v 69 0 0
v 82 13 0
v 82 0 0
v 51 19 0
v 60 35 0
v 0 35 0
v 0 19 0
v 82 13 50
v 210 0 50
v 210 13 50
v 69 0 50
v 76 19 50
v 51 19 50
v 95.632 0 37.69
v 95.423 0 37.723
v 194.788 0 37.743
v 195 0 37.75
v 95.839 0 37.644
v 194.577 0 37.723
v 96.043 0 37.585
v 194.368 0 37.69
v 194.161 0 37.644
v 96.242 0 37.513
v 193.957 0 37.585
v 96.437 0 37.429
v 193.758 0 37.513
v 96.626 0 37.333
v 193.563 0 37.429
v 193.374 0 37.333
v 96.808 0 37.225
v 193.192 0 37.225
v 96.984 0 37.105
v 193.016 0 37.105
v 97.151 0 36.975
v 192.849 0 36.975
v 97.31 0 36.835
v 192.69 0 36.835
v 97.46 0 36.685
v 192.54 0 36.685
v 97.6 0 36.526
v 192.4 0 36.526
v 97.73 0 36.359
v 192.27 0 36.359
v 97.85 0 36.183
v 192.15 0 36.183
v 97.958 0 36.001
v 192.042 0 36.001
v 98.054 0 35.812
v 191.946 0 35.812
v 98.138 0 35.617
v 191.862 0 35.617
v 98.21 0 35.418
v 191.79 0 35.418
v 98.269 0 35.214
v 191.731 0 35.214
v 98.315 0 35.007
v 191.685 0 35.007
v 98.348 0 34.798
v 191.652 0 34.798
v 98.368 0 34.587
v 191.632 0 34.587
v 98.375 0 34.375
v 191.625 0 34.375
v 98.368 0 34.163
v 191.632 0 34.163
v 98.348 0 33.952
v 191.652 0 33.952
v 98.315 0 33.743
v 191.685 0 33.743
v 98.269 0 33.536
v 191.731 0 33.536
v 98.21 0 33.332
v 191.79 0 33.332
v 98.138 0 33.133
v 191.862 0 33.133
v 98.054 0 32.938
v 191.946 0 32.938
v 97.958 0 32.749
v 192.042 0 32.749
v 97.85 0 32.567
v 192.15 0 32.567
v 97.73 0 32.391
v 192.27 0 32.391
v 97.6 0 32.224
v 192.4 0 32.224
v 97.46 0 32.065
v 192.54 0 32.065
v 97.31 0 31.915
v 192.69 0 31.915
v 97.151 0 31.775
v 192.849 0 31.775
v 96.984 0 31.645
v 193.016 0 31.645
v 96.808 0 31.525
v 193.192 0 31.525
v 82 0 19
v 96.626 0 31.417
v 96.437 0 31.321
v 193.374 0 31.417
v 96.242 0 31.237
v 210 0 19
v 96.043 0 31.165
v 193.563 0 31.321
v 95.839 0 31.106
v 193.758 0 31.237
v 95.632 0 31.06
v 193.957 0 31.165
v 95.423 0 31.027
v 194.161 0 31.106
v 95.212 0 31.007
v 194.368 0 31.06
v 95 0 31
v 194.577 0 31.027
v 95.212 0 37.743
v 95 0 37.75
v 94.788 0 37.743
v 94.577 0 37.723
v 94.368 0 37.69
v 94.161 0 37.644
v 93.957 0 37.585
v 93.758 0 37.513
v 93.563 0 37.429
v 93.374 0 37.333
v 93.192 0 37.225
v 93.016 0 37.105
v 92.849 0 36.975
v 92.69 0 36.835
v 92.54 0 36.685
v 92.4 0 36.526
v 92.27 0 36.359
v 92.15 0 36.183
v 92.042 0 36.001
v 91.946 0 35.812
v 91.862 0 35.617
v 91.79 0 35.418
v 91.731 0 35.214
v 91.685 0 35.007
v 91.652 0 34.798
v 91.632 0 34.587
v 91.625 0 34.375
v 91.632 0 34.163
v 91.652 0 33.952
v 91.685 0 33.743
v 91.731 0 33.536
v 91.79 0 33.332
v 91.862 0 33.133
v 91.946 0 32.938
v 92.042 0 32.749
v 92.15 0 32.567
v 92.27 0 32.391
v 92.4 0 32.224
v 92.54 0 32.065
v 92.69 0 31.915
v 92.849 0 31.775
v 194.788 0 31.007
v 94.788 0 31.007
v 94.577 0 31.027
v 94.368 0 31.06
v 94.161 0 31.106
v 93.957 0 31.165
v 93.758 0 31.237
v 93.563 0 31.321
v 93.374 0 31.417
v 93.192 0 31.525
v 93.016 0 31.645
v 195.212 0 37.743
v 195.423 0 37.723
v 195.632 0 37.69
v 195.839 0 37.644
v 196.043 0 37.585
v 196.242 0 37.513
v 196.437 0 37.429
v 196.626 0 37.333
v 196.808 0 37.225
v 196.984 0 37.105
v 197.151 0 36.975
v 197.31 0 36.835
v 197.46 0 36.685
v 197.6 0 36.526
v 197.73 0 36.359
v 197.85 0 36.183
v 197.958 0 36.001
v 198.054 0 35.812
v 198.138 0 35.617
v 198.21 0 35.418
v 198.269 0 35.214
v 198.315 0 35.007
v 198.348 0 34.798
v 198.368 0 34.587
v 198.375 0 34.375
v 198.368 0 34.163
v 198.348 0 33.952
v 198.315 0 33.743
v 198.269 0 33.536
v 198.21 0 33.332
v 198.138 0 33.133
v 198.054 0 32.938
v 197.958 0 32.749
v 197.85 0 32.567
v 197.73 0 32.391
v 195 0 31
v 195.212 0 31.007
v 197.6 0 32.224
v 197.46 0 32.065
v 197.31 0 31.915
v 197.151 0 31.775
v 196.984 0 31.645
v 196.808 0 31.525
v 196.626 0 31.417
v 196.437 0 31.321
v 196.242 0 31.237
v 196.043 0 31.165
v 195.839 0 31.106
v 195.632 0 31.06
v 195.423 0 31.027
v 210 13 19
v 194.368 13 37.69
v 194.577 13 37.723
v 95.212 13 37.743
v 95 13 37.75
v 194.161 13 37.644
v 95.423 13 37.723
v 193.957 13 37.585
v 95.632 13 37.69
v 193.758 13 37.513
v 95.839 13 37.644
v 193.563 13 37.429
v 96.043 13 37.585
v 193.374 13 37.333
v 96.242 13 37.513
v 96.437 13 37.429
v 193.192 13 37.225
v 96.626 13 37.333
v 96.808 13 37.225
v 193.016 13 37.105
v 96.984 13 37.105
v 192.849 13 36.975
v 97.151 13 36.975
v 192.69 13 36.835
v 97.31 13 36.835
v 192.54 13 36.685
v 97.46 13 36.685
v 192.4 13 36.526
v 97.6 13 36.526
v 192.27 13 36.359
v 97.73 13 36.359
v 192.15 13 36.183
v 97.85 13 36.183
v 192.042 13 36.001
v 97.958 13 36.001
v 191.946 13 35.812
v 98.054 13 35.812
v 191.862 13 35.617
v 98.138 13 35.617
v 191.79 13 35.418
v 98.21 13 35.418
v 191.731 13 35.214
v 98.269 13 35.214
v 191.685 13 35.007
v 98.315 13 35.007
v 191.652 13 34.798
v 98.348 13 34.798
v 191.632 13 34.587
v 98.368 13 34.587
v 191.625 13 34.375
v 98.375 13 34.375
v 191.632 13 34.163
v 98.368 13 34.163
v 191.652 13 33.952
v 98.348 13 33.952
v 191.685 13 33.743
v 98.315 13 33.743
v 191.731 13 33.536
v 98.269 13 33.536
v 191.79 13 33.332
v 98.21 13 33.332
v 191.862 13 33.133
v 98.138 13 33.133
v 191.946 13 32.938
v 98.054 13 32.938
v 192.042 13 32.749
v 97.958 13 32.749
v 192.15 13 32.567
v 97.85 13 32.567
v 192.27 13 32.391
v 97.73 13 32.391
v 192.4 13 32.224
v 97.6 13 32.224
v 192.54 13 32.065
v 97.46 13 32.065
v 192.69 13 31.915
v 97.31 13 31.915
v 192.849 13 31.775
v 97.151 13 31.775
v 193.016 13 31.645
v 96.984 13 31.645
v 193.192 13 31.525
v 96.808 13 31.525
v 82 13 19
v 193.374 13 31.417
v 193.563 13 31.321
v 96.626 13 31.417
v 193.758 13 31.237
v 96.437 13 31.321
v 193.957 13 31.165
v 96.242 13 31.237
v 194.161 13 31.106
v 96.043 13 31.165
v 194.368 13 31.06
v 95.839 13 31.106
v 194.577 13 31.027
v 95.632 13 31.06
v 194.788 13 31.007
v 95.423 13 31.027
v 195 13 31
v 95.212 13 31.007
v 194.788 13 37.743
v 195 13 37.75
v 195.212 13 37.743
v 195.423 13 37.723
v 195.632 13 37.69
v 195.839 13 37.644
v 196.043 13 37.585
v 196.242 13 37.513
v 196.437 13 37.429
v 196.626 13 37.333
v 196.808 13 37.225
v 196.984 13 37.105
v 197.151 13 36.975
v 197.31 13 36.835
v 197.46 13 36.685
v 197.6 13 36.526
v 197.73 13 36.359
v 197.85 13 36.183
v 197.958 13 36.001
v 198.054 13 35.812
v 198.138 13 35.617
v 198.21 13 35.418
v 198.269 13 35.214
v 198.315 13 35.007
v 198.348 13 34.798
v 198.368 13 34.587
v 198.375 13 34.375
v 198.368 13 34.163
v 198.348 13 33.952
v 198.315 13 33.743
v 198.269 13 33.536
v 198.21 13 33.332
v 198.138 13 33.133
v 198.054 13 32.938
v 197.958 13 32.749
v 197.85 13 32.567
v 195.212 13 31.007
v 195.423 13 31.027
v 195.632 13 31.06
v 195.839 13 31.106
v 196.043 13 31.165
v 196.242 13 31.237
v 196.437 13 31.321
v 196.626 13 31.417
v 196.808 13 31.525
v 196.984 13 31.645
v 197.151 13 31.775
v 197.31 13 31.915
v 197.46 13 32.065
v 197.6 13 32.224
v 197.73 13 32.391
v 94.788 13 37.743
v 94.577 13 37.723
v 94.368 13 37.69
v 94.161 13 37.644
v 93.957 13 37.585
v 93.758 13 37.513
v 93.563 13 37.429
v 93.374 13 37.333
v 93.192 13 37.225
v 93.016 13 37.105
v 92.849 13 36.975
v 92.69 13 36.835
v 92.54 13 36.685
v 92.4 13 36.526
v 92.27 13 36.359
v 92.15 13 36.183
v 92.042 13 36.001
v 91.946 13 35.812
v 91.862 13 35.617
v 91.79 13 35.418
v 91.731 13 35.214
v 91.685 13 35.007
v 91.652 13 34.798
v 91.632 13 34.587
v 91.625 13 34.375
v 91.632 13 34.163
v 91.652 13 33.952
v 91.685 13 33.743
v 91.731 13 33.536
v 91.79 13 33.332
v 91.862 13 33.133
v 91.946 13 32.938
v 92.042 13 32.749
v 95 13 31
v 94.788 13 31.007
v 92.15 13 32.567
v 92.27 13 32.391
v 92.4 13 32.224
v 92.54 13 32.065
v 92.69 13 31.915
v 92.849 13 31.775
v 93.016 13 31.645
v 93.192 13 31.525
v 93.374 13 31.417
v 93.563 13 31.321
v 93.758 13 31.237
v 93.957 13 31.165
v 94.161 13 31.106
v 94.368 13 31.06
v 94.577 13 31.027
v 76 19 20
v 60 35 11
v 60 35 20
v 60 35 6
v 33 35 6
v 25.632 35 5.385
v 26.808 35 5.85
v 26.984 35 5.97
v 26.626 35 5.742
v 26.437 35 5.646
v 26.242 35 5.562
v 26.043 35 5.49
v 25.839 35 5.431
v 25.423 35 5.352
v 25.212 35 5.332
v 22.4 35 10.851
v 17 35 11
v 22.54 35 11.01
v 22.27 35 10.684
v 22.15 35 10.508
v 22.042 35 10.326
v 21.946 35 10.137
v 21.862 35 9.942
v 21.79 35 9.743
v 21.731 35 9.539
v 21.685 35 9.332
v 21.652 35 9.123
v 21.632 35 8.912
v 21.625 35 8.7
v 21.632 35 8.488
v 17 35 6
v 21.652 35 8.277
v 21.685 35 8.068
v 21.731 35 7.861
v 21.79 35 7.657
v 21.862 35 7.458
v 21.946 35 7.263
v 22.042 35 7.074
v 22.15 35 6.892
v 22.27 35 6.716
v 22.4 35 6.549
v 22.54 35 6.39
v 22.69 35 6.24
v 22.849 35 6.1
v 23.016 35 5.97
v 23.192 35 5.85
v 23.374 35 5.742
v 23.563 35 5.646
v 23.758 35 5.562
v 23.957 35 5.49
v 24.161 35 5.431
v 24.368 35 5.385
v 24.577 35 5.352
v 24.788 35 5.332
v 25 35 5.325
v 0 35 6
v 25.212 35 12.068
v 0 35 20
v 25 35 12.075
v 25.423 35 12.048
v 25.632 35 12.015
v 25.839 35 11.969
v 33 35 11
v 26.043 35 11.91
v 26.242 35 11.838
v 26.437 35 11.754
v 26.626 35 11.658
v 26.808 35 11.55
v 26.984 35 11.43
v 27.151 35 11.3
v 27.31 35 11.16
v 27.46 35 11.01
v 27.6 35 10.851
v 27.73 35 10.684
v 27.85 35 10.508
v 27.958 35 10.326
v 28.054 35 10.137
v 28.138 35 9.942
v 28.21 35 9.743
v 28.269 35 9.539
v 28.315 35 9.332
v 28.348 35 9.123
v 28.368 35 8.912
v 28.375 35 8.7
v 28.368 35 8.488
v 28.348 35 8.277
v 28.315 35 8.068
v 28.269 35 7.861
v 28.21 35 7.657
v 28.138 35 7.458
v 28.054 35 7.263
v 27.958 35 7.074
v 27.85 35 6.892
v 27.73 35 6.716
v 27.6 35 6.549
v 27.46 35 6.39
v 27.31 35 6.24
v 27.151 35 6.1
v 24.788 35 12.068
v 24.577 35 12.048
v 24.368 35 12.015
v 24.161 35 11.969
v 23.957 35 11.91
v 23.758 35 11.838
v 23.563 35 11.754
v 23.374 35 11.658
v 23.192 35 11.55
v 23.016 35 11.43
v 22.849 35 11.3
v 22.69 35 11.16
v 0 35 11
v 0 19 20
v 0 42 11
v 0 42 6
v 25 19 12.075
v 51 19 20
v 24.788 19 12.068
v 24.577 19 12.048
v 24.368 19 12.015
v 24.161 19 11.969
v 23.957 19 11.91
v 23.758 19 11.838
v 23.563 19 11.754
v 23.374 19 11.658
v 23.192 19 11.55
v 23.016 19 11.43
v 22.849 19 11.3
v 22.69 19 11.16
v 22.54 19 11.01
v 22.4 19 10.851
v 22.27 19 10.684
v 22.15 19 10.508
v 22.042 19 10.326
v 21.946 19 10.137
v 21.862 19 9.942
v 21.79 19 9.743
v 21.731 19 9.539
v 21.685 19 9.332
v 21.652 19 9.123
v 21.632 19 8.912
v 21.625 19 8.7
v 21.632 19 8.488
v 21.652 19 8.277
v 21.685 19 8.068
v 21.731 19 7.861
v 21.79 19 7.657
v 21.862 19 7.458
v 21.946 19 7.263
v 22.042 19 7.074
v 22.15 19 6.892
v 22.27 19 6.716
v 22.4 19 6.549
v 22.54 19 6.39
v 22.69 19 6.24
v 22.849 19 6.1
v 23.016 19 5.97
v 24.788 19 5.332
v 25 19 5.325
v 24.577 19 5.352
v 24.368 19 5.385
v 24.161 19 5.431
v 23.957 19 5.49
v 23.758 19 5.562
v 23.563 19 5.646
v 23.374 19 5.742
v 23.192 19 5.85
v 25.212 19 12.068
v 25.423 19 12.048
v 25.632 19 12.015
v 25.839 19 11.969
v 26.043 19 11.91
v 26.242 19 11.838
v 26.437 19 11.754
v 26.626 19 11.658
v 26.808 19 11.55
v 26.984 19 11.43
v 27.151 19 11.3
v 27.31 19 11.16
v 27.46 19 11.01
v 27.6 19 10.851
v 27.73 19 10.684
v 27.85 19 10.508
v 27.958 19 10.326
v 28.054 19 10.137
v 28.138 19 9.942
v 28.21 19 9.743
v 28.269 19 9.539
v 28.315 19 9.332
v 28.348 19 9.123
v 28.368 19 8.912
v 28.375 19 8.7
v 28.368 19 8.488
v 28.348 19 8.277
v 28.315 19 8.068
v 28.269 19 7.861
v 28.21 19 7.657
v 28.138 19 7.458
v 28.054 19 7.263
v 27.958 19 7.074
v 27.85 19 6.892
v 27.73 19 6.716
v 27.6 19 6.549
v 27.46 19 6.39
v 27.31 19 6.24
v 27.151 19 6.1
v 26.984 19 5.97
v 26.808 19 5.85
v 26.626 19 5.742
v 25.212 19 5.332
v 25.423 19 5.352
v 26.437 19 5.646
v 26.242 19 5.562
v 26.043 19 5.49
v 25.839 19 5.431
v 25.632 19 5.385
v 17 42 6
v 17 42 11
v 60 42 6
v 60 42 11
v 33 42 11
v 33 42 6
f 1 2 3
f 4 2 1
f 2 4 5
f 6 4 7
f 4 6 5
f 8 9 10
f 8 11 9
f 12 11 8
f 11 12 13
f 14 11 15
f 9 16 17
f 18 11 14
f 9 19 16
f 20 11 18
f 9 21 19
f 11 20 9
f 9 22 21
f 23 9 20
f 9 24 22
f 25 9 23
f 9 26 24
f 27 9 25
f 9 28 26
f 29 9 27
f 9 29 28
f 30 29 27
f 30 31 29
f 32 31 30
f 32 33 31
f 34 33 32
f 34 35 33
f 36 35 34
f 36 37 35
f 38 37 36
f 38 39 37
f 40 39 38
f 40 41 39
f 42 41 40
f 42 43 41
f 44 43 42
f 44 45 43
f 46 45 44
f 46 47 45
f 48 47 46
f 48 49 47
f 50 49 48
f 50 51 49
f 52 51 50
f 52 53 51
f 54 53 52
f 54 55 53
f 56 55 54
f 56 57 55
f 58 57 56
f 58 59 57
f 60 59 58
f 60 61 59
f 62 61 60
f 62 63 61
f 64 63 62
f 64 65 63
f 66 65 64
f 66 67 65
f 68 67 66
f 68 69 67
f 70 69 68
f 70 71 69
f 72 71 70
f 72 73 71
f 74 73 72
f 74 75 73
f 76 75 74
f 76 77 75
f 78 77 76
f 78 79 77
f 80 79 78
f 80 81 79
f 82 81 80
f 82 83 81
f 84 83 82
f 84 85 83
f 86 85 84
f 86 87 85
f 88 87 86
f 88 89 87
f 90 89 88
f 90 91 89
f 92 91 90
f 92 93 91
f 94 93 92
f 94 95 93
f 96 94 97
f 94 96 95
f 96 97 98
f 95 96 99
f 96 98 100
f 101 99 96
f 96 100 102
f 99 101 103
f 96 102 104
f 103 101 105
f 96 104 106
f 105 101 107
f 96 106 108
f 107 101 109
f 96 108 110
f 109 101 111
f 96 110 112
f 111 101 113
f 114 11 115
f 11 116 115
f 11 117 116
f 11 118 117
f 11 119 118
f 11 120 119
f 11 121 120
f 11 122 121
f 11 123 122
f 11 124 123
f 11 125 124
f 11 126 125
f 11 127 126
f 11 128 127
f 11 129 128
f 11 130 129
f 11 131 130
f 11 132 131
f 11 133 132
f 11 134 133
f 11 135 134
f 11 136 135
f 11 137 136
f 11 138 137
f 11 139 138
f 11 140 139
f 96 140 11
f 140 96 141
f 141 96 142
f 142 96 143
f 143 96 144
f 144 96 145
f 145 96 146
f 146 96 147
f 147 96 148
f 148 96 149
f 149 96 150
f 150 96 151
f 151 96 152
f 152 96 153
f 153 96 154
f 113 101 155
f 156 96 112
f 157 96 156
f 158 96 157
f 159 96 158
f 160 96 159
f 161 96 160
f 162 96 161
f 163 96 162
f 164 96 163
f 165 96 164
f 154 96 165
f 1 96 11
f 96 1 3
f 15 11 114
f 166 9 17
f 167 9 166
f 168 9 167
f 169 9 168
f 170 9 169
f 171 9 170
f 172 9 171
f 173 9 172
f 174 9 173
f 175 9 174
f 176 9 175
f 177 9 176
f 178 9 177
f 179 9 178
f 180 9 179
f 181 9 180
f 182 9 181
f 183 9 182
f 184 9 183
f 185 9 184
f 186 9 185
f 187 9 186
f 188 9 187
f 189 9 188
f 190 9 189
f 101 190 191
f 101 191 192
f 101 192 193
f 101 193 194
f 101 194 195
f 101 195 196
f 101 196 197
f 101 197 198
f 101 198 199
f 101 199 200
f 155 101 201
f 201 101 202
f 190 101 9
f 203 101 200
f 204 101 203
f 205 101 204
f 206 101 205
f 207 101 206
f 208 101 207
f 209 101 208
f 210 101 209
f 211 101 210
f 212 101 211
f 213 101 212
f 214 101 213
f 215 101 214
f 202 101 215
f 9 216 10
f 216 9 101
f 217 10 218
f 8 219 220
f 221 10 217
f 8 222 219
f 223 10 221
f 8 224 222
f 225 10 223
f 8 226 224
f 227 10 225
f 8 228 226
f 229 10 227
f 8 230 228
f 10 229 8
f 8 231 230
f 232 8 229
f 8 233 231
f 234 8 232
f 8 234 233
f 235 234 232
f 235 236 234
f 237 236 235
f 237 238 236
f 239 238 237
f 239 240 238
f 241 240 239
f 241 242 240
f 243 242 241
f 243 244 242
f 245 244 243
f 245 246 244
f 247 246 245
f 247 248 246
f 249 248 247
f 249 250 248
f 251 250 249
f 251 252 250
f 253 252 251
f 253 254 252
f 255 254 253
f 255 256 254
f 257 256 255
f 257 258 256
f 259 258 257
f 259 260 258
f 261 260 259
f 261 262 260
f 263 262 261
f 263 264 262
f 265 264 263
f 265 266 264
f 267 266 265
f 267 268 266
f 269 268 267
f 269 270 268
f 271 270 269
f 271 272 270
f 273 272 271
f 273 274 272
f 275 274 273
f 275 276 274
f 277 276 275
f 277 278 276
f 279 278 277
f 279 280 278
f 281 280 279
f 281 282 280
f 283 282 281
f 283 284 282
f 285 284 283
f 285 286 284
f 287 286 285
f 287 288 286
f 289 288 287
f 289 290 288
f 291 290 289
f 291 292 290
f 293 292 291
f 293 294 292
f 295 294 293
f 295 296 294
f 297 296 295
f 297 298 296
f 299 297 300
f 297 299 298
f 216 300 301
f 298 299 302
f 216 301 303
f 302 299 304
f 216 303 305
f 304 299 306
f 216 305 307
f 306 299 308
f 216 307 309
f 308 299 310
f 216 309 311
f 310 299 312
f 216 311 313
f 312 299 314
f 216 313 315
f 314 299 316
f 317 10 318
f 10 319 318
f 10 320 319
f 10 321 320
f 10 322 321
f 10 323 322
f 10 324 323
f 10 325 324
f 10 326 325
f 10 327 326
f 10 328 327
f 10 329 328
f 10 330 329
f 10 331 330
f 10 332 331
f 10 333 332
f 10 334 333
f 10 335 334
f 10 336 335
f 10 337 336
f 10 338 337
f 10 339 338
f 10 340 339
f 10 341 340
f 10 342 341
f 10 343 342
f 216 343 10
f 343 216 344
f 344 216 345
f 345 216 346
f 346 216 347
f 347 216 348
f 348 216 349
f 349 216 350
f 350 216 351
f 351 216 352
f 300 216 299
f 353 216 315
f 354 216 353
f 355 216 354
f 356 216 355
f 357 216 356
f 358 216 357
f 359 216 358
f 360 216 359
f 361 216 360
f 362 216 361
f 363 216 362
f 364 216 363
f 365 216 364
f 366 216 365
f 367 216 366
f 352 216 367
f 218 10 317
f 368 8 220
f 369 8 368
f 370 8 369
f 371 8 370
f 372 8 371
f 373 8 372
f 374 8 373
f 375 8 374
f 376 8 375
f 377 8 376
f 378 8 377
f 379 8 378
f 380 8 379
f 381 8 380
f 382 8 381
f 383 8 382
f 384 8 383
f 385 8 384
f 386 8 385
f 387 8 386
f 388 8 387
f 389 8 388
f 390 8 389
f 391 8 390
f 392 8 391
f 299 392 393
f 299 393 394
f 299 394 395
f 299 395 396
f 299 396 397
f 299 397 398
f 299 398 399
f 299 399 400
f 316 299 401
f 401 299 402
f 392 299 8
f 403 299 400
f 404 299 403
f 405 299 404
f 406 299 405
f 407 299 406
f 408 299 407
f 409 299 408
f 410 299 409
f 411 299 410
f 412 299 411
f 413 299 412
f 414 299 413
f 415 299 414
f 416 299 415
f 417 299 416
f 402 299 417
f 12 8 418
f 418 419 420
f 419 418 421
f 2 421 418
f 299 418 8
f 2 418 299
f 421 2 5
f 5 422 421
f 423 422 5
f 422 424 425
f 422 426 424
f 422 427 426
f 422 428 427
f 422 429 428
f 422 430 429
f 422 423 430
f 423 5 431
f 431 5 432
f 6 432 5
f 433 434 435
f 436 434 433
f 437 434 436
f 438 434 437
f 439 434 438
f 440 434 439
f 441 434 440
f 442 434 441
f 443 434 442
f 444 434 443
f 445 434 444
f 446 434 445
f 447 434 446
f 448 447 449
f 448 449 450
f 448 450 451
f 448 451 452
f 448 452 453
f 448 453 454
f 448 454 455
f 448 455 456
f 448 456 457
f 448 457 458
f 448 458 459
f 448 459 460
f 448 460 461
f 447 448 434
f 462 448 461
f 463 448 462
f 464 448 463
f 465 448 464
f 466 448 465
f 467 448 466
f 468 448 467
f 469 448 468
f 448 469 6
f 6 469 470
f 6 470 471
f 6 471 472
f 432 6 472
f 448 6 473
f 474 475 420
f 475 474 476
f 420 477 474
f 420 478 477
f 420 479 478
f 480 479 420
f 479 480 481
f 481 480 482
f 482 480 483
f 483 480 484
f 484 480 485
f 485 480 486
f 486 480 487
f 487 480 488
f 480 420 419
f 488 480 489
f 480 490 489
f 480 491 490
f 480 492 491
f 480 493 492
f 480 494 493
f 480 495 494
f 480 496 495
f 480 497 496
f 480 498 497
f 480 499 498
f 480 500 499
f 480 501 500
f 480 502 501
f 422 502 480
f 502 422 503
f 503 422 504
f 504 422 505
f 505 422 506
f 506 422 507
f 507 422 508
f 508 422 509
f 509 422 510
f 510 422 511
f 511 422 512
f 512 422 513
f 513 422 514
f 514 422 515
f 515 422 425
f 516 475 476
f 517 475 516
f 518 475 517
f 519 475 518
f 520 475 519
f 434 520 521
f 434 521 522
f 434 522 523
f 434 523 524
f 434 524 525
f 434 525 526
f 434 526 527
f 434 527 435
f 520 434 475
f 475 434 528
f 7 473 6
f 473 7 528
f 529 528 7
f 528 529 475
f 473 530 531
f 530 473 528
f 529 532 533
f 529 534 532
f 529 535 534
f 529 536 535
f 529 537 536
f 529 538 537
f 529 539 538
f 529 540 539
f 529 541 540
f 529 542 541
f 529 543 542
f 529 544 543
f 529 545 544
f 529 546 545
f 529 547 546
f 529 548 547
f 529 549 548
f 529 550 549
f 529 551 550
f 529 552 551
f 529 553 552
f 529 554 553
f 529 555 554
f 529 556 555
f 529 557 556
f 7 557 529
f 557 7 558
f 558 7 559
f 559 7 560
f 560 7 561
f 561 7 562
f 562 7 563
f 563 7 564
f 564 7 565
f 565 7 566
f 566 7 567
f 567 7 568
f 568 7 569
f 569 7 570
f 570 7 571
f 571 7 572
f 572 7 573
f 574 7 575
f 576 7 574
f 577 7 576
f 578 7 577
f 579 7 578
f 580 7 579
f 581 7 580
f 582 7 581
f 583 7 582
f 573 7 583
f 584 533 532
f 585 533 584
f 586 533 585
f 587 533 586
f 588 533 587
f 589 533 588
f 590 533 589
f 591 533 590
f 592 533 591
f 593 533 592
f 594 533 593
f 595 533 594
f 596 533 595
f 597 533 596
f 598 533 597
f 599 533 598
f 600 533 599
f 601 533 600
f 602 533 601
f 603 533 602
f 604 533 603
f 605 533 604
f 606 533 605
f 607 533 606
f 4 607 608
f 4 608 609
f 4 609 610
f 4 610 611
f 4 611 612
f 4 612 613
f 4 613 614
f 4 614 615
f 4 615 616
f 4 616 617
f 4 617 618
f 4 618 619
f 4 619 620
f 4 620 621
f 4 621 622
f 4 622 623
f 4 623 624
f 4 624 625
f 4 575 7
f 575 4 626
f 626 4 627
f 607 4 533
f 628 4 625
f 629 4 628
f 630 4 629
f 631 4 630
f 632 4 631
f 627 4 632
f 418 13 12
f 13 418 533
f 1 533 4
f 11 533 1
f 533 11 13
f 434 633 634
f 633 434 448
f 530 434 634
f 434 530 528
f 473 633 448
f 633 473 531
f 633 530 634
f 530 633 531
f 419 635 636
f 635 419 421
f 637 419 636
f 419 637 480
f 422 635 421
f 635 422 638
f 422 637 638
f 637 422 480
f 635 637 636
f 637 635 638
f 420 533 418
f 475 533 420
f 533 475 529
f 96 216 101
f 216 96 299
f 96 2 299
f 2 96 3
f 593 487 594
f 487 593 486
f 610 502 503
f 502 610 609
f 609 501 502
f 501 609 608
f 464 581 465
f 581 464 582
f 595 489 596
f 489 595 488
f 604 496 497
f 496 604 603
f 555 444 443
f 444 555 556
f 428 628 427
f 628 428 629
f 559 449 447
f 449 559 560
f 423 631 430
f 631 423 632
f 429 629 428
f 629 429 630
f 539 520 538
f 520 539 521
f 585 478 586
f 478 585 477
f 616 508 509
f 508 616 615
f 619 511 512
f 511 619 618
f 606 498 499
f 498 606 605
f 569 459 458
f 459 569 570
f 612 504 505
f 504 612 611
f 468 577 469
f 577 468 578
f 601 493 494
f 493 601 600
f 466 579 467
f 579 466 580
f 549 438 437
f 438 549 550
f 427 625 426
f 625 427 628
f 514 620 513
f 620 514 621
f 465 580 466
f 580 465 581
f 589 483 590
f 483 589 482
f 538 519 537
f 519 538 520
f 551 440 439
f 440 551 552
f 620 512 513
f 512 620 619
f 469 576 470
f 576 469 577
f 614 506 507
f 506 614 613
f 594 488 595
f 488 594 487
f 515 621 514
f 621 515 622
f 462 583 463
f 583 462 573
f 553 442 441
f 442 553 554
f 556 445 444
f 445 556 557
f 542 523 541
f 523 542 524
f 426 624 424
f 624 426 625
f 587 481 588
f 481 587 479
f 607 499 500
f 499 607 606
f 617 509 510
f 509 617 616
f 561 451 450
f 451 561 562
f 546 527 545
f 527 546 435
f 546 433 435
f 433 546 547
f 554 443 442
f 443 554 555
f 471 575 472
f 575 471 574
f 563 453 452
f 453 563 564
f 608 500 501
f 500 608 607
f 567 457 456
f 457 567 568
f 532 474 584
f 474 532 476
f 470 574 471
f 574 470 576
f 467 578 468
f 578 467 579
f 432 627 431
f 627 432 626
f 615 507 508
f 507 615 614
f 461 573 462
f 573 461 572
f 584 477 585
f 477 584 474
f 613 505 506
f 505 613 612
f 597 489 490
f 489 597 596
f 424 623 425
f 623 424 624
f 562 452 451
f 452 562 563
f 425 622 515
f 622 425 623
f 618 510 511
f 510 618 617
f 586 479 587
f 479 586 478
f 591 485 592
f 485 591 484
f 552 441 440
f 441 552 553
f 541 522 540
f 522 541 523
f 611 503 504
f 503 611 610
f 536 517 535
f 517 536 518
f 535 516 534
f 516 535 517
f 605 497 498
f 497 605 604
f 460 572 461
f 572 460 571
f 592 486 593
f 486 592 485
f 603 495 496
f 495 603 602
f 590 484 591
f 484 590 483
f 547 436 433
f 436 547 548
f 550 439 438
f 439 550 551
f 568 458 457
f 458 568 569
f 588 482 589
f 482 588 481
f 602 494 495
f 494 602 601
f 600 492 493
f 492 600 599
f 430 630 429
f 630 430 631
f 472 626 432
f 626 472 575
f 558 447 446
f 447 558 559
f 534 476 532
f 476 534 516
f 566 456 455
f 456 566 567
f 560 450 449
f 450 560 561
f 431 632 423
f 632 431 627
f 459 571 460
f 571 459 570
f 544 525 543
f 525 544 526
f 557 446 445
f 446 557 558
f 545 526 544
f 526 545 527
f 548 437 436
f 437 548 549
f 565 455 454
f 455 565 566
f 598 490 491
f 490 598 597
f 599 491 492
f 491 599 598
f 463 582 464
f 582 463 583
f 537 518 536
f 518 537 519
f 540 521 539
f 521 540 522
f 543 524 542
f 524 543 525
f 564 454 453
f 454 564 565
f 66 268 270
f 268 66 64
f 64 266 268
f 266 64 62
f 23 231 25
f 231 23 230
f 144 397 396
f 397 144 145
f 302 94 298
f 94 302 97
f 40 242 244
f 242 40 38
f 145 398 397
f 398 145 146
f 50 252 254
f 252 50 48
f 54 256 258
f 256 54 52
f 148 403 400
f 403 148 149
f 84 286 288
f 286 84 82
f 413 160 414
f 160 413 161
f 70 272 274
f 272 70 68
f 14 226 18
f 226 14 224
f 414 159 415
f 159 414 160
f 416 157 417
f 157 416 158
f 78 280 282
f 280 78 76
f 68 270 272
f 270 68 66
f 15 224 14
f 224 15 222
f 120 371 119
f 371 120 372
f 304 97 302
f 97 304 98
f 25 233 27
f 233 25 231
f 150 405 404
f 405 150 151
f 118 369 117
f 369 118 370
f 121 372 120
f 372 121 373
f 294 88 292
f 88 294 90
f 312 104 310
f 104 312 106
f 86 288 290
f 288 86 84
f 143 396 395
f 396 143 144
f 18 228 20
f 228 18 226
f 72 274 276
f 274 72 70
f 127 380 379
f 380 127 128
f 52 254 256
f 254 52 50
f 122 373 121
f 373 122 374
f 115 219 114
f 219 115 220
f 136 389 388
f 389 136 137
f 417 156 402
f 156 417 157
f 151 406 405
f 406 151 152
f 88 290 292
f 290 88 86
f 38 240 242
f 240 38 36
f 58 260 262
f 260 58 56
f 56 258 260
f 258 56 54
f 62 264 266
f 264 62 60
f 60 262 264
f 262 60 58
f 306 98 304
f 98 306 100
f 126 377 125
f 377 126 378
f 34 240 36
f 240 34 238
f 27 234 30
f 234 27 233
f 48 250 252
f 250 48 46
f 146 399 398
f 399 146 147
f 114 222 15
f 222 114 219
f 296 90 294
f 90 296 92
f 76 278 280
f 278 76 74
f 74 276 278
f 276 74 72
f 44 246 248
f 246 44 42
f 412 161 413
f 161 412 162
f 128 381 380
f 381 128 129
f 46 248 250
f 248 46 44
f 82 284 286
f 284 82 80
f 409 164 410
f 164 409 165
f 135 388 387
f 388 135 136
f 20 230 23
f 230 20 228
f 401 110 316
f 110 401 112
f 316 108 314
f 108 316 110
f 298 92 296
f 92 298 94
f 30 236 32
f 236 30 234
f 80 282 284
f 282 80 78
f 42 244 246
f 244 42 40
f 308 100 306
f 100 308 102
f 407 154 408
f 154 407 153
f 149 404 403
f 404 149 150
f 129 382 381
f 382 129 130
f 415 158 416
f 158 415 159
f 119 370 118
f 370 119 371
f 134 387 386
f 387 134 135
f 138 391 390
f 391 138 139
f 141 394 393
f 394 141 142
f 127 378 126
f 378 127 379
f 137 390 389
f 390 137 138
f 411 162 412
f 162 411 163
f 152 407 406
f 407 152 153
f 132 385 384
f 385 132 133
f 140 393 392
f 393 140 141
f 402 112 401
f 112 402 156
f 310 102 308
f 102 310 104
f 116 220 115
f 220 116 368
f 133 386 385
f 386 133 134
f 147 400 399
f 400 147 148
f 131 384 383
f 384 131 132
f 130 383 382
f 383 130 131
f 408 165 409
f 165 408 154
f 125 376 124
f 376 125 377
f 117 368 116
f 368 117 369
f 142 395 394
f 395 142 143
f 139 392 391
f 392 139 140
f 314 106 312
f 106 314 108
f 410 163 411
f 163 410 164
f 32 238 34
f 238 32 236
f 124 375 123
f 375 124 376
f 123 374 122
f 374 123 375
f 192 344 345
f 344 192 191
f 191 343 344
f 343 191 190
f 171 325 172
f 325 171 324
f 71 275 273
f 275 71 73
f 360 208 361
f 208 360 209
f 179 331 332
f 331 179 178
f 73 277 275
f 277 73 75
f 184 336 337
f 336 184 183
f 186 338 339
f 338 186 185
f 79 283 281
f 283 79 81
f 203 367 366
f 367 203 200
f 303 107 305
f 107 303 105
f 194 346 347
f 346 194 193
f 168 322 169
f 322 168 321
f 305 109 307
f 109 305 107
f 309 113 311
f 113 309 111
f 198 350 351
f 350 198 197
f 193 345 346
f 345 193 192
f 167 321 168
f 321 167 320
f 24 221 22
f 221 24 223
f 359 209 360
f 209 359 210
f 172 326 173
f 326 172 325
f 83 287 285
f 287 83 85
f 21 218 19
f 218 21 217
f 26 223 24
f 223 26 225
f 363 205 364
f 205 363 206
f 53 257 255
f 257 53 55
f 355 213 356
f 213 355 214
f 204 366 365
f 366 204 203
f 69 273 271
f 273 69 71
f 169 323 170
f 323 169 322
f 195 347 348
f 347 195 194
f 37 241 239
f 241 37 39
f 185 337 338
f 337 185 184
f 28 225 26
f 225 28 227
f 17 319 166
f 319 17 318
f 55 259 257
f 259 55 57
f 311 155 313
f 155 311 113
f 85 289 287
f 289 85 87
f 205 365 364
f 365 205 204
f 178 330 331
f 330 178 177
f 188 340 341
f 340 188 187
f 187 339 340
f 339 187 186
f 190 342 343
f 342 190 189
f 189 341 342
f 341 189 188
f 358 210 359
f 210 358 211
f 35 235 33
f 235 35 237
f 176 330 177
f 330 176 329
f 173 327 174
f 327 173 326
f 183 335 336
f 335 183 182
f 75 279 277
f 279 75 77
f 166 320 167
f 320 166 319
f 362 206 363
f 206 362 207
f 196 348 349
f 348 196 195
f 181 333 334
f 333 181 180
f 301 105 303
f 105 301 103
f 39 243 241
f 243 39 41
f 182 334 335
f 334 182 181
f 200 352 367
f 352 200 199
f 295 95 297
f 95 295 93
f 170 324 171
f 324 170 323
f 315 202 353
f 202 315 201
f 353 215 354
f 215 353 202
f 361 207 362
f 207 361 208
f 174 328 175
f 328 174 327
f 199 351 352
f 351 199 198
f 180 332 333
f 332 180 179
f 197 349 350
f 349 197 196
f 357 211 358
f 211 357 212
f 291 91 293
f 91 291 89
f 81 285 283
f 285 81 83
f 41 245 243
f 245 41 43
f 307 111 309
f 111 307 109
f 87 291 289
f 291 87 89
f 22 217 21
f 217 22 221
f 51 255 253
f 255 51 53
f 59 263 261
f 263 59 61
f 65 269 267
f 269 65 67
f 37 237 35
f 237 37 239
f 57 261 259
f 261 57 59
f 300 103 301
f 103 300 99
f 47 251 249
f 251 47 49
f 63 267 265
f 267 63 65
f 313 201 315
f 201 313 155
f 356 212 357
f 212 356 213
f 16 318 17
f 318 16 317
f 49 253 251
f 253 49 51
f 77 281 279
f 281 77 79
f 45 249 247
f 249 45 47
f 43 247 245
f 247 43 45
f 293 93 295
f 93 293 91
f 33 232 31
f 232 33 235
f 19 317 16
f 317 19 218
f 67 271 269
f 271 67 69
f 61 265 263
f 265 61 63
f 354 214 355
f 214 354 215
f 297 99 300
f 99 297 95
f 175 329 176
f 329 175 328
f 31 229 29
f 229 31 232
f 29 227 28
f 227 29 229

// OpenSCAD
$fn = $preview ? 25 : 100;
difference(){
    union(){
    linear_extrude(50)
    difference(){
        square([210,35]);
        polygon([[60,35],[220,35],[220,13],[82,13]]);
        polygon([[0,0],[0,19],[51,19],[69,0]]);
    

    }
    
    translate([0,35,6]) cube([17,7,5]);
    translate([33,35,6]) cube([27,7,5]);
    }

    translate([-1,19,20]) cube([151,30,51]);
    translate([82,-1,-1]) cube([220,20,20]);

    translate([25,15,8.7]) rotate([-90,0,0])cylinder(d=6.75,h=50);
    
    translate([95,-5,34.375]) rotate([-90,0,0])cylinder(d=6.75,h=50);
    
    translate([195,-5,34.375]) rotate([-90,0,0])cylinder(d=6.75,h=50);
}
